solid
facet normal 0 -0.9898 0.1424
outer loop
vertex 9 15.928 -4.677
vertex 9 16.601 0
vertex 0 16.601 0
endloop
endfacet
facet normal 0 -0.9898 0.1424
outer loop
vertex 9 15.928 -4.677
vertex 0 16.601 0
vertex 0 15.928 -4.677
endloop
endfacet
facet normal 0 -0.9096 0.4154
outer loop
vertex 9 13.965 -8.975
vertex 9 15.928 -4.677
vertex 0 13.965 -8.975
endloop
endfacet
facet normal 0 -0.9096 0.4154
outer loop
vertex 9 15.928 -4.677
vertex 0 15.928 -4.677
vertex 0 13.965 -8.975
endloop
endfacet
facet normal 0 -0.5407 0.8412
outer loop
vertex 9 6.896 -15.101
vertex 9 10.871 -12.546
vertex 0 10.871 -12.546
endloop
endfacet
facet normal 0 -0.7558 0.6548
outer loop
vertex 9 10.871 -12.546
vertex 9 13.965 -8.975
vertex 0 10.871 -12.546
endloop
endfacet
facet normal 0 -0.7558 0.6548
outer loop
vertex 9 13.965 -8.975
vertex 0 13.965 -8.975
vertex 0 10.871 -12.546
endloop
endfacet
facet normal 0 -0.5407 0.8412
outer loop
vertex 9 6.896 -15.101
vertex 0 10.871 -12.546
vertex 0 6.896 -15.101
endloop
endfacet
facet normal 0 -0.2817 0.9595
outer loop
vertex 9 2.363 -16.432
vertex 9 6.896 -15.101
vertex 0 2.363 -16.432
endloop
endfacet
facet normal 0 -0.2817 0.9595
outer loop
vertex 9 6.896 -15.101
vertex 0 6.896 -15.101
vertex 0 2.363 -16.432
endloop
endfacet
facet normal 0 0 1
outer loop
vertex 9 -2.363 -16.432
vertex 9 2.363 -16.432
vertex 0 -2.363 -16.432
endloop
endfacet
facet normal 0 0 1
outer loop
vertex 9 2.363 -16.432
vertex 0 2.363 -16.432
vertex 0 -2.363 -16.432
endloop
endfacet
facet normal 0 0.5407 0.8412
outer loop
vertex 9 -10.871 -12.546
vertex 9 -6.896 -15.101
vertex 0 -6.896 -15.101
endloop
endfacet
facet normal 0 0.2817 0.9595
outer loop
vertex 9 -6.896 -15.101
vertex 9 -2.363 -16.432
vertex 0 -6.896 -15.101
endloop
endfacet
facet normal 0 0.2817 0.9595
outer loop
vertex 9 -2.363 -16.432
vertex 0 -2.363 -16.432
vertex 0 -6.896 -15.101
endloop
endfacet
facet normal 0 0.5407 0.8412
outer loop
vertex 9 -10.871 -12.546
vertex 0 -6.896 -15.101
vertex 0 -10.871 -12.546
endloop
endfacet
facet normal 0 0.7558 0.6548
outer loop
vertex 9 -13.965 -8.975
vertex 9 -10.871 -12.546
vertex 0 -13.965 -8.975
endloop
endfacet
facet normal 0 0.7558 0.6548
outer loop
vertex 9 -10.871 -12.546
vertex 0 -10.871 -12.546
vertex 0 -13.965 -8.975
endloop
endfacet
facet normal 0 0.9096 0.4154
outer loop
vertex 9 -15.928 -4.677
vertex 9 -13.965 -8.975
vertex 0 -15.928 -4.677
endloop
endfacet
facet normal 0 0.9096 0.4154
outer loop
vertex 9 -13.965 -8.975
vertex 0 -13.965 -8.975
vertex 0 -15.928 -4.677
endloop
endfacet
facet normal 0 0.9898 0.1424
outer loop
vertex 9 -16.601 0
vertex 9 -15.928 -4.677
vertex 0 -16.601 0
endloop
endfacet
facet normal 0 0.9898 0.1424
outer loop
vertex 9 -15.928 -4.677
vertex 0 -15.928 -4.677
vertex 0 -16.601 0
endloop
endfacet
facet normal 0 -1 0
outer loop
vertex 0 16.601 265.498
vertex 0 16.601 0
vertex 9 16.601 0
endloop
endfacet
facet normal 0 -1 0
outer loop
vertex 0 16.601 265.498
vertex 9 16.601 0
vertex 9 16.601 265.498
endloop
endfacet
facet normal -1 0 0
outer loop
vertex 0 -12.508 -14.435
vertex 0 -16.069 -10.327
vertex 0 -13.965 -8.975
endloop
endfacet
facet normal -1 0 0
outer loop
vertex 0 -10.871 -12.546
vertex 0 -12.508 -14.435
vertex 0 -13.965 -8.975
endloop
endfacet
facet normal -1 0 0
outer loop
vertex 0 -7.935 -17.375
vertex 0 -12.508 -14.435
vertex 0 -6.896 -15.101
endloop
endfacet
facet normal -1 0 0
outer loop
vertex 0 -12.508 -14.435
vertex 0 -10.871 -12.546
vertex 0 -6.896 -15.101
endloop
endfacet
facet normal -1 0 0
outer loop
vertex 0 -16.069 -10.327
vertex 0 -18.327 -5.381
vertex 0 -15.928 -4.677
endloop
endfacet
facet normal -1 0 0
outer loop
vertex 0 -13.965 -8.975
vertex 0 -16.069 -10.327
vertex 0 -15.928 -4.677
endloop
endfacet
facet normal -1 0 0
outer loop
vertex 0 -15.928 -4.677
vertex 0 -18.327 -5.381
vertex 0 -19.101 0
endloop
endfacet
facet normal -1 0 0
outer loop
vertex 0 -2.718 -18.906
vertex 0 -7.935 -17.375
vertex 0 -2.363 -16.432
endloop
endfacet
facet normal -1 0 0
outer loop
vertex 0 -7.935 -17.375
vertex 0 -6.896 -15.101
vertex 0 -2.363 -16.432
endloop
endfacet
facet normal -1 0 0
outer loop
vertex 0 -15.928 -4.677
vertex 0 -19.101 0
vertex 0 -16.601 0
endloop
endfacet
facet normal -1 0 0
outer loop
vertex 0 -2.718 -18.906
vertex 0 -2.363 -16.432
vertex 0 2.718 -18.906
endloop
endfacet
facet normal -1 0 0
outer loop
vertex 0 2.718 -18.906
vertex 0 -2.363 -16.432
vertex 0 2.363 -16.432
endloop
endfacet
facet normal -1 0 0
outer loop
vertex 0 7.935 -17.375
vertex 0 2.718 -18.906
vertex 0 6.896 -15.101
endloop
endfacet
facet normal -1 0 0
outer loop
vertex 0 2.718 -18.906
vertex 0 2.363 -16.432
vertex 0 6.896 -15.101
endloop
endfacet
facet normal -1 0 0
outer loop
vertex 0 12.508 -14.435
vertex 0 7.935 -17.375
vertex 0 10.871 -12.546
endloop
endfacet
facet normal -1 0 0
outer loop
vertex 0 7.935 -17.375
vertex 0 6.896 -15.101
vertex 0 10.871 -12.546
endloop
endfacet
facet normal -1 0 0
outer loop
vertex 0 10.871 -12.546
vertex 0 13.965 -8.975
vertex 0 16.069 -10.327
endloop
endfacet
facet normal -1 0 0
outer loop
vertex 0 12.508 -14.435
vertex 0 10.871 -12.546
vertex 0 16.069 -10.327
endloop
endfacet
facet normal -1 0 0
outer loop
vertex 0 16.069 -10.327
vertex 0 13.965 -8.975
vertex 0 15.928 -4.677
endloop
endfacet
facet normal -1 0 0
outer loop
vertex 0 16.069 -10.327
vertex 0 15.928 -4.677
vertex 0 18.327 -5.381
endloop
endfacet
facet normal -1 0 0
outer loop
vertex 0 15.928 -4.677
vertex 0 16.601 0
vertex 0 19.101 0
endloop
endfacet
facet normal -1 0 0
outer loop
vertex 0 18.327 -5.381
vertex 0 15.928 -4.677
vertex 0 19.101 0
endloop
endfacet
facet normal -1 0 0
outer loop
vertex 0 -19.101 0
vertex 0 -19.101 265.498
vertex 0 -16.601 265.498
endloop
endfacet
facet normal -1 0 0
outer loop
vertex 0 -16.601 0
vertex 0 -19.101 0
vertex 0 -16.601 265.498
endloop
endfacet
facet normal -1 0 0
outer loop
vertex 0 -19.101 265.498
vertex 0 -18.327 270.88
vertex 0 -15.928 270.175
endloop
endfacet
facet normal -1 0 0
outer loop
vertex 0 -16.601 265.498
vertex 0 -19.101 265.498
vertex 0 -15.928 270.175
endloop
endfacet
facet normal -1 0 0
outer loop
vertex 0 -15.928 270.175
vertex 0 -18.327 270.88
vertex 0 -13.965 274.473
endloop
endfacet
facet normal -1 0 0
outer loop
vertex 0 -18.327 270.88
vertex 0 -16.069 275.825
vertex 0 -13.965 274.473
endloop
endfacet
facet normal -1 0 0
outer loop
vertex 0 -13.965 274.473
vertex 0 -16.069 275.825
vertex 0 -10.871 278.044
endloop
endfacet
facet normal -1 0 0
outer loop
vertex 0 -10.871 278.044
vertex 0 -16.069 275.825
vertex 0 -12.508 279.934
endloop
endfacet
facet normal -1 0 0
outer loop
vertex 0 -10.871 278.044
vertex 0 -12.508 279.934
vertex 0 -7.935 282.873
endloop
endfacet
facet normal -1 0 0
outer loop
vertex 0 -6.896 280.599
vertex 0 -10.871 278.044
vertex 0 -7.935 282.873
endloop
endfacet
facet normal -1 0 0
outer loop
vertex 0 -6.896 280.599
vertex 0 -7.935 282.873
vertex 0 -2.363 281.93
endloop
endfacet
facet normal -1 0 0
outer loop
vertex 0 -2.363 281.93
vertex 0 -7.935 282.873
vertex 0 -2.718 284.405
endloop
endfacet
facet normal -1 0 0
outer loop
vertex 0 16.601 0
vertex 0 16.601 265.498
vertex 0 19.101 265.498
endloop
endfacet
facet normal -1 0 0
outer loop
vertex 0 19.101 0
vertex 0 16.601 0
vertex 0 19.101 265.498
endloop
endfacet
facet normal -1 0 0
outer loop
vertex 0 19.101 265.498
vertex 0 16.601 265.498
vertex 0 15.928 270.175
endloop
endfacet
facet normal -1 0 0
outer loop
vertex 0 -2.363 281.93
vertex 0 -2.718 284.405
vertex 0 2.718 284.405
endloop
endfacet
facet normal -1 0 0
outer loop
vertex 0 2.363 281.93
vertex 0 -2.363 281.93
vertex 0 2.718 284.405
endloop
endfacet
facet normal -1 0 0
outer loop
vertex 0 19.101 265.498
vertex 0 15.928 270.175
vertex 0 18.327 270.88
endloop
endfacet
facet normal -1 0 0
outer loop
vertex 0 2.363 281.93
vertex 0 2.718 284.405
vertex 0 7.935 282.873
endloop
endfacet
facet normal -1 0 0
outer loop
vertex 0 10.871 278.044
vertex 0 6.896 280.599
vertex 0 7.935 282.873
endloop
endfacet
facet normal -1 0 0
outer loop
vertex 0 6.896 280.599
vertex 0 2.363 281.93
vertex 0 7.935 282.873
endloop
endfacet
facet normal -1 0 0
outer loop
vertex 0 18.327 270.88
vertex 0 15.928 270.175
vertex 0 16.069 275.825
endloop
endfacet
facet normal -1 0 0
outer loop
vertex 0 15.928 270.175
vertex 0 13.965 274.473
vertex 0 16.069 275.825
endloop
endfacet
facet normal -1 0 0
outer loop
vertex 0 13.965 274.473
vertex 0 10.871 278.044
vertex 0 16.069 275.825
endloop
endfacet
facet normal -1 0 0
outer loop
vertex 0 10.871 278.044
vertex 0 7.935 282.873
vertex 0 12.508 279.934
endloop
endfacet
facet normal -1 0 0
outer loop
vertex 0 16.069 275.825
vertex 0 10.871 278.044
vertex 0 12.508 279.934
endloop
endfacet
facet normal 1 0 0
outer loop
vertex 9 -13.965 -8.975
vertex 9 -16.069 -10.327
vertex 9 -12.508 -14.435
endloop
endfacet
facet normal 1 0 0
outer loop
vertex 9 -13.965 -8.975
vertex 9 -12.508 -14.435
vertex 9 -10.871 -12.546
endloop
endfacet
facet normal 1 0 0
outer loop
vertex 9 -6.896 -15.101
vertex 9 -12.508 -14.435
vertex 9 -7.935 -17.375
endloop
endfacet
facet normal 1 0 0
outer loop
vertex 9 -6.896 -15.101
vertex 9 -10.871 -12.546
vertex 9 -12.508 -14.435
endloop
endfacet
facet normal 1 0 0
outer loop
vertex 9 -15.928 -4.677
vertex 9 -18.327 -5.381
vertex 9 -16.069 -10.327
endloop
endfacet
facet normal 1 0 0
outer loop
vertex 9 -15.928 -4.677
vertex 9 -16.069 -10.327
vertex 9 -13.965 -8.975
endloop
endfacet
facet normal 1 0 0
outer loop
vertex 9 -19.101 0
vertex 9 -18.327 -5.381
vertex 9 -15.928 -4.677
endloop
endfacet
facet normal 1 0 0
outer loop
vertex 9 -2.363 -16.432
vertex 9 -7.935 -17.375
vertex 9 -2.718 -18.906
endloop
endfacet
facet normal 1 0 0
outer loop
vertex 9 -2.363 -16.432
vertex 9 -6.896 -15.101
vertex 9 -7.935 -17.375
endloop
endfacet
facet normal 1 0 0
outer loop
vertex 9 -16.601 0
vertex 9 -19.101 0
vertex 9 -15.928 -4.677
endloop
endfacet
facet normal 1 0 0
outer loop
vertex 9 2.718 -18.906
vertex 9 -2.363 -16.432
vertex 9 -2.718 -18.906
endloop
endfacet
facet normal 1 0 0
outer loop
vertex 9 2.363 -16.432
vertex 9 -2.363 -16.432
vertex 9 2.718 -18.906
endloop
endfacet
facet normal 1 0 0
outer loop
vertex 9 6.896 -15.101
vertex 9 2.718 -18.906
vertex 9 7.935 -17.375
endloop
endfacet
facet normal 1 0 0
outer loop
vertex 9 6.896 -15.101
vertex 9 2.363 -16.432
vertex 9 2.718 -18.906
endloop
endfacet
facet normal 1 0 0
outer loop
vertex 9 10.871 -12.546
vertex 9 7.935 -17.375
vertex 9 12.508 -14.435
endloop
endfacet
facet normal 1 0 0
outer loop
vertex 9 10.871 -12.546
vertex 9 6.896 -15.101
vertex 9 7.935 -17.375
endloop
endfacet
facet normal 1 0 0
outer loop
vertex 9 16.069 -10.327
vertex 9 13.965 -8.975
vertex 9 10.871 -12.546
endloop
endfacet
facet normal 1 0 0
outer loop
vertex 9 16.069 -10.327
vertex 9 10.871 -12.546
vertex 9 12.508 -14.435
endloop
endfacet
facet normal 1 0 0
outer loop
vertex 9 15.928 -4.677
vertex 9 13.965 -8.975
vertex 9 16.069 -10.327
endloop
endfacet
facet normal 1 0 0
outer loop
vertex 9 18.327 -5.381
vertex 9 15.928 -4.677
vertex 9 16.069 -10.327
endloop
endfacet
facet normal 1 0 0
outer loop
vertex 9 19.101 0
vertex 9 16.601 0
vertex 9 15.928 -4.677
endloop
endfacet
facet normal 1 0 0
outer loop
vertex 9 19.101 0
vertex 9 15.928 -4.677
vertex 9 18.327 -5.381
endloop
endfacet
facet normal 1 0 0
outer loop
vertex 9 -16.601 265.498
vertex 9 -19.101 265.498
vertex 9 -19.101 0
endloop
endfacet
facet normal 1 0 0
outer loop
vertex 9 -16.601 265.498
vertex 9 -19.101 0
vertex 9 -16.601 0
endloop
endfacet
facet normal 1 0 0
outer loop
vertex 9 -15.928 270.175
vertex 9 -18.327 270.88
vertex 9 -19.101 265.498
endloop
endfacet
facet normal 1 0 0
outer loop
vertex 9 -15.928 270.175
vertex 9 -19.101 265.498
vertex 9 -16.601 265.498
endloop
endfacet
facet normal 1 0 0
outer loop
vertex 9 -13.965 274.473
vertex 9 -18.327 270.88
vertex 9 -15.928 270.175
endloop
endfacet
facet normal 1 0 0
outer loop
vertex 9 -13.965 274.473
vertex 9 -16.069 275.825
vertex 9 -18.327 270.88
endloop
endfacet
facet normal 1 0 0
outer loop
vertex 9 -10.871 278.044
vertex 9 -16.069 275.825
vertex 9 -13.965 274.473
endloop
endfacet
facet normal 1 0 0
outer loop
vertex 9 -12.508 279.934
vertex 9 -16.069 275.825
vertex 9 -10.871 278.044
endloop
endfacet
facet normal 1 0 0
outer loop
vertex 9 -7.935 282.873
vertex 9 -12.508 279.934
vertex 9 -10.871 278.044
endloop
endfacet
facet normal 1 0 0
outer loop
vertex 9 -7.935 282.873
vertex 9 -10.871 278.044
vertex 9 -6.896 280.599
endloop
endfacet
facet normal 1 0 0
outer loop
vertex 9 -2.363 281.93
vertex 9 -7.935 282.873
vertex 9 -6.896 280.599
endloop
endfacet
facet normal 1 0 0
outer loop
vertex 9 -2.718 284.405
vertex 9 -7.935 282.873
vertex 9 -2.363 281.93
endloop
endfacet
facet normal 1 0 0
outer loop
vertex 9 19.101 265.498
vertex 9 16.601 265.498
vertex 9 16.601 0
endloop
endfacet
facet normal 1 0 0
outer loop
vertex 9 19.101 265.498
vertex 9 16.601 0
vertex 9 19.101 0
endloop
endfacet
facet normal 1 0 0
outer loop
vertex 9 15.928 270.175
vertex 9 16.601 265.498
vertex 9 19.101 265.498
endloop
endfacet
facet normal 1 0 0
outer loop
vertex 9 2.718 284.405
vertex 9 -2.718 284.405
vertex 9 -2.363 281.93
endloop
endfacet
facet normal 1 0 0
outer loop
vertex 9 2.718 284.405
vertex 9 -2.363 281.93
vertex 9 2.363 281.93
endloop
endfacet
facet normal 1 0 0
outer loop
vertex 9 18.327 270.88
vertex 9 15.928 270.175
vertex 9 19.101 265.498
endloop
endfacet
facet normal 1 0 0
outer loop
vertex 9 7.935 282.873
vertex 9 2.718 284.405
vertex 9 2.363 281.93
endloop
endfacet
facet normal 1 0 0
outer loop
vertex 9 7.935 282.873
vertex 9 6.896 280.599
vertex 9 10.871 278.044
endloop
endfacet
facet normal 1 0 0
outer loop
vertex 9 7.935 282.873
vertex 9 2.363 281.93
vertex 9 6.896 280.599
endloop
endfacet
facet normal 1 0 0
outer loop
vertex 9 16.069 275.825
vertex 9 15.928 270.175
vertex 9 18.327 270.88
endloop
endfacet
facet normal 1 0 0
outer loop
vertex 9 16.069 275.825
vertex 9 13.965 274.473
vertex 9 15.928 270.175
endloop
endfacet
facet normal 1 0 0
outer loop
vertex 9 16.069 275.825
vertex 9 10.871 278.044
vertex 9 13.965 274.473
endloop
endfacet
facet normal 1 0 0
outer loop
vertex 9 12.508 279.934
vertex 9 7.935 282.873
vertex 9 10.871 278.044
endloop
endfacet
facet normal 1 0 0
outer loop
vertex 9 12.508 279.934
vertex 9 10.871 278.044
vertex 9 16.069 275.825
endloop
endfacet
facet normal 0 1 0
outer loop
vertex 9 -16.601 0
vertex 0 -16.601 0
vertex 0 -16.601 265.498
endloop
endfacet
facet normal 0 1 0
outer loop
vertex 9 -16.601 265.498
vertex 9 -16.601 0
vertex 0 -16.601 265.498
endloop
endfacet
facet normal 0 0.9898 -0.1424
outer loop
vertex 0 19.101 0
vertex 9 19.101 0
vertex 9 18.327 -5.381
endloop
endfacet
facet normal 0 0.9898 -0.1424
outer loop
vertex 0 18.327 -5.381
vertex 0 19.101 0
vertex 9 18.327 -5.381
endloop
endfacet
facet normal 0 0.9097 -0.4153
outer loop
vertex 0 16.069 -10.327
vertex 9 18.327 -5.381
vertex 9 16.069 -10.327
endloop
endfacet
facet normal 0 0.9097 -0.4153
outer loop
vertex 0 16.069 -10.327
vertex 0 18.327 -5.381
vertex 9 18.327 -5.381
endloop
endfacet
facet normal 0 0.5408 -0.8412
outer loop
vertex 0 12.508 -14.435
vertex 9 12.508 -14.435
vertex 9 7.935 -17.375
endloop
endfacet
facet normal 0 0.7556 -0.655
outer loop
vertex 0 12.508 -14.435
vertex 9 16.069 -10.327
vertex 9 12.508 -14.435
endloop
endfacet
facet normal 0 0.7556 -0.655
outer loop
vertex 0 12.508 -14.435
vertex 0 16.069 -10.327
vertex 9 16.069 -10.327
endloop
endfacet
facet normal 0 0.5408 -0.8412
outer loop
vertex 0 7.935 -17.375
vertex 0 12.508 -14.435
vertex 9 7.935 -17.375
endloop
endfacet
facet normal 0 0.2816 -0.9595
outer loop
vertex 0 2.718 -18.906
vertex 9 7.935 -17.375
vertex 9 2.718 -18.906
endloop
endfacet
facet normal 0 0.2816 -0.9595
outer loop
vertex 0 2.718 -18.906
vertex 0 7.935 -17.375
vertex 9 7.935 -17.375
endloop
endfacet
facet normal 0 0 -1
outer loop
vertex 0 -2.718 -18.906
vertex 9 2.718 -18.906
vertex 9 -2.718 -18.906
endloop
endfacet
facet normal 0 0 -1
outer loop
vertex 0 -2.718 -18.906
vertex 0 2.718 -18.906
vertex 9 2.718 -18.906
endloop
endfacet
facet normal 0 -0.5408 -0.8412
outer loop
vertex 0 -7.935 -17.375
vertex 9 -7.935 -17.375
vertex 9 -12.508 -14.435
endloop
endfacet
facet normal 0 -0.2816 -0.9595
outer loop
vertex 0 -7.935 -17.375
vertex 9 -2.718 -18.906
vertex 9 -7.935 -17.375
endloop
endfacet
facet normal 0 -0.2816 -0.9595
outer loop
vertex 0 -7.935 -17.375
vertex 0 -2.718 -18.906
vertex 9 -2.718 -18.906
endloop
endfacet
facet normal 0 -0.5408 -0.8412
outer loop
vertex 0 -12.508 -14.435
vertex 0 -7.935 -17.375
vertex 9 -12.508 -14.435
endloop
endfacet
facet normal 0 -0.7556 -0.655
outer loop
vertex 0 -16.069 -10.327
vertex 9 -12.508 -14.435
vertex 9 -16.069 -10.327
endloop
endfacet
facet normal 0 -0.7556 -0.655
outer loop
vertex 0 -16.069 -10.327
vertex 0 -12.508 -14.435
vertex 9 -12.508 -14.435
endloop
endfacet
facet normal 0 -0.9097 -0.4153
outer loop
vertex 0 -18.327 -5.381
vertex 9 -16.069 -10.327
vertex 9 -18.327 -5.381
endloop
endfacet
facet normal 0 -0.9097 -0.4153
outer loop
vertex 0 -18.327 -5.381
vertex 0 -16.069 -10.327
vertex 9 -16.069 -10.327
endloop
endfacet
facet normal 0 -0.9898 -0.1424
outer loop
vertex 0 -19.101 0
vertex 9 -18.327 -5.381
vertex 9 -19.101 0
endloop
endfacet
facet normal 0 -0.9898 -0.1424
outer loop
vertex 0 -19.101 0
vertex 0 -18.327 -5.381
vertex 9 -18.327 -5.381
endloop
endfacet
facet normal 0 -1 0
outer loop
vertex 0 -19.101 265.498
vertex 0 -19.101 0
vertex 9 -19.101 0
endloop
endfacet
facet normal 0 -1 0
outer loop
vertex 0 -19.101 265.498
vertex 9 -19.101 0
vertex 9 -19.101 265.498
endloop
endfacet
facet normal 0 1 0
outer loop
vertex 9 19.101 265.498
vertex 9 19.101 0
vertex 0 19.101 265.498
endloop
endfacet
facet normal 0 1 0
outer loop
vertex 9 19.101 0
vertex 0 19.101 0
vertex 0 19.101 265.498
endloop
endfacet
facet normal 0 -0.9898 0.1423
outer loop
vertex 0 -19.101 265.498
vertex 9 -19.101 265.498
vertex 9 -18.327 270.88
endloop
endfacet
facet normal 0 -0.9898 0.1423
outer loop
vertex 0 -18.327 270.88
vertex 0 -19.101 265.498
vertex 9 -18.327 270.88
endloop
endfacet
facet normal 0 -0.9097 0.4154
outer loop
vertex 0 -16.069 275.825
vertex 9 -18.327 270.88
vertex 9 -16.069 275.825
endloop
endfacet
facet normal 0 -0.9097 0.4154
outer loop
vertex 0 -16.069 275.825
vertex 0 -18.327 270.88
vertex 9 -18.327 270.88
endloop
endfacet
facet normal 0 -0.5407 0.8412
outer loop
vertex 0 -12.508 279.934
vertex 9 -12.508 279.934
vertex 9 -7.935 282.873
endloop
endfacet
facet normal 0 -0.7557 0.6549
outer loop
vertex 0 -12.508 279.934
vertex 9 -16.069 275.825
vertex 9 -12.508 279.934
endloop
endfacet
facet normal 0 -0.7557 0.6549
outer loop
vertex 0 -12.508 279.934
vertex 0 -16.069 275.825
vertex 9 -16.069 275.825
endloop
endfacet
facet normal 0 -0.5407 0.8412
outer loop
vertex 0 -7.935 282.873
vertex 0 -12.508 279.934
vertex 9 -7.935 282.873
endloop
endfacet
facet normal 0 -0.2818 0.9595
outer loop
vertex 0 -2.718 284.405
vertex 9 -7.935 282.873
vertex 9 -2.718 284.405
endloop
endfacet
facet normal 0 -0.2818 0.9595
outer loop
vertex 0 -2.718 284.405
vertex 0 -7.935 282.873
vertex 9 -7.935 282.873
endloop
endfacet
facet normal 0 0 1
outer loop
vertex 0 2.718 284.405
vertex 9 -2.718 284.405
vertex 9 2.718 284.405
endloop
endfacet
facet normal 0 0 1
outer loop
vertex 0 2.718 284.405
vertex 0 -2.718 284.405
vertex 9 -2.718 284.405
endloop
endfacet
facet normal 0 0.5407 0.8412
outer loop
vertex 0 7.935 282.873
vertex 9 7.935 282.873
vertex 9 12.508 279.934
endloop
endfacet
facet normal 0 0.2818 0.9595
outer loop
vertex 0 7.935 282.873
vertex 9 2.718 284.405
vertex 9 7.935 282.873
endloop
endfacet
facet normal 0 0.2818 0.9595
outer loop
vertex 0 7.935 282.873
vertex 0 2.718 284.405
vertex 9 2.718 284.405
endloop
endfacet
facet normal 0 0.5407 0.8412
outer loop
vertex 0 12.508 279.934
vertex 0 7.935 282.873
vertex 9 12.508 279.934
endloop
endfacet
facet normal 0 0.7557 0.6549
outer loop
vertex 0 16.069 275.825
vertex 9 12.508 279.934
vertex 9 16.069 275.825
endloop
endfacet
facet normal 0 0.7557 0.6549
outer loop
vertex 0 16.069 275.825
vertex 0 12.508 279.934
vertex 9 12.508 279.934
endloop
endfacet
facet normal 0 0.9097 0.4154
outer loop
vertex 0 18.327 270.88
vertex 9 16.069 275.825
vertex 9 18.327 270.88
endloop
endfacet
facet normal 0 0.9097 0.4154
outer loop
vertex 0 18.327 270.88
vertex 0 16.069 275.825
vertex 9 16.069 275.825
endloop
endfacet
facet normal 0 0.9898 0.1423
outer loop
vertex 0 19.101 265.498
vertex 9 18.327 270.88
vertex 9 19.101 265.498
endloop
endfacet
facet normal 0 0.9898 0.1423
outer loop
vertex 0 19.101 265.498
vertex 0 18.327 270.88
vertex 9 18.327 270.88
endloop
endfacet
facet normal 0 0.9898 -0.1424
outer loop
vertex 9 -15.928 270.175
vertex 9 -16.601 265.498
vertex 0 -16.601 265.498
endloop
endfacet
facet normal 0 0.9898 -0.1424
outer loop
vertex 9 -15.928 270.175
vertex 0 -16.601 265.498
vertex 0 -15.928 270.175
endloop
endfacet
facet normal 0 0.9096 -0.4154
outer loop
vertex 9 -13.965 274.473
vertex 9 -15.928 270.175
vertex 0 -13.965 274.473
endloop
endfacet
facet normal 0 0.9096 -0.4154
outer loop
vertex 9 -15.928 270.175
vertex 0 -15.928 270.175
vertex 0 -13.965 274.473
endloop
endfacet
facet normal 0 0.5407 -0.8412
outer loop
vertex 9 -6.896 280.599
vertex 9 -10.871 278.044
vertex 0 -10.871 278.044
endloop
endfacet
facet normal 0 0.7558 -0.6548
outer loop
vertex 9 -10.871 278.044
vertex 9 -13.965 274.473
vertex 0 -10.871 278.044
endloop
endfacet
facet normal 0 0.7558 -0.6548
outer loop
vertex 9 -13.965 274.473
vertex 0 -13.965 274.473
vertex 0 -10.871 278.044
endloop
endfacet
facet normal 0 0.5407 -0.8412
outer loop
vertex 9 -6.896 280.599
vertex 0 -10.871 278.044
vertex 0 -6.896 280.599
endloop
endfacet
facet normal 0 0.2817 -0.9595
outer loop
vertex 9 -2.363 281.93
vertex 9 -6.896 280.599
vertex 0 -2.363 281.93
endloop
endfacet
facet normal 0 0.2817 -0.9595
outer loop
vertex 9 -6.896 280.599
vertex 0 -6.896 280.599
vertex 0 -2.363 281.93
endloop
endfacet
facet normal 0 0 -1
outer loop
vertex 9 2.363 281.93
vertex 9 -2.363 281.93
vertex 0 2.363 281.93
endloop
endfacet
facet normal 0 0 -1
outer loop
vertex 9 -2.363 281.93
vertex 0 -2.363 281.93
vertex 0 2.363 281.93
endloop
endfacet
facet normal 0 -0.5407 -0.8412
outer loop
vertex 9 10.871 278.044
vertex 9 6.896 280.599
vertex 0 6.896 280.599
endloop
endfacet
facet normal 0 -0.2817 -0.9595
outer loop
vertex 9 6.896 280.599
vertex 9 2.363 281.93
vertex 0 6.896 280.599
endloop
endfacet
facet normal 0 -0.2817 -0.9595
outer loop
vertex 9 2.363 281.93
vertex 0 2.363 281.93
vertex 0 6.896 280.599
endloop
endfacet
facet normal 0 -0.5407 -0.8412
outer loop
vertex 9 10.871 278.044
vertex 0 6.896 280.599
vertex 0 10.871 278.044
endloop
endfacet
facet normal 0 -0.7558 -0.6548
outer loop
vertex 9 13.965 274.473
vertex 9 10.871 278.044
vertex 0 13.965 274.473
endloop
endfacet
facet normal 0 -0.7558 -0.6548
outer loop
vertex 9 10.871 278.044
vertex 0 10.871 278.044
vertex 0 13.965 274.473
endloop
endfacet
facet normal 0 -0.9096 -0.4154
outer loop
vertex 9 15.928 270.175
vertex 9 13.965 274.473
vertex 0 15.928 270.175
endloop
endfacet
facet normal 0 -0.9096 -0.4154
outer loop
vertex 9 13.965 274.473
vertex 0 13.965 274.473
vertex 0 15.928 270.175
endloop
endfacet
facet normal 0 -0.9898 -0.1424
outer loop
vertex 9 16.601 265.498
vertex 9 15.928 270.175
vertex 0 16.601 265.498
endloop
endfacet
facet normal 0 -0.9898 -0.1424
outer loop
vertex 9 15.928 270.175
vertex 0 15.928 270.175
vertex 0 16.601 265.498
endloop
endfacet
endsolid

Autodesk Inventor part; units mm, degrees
ref_plane "YZ Plane" through (0, 0, 0) normal (1, 0, 0) x (0, 1, 0)
ref_plane "XZ Plane" through (0, 0, 0) normal (0, 1, 0) x (-1, 0, 0)
ref_plane "XY Plane" through (0, 0, 0) normal (0, 0, 1) x (1, 0, 0)
sketch "Sketch1" plane through (0, 0, 0) normal (1, 0, 0) x (0, 1, 0)
  arc A0 (-16.6008, 0) -> (16.6008, 0) centre (0, 0) ccw
  arc A1 (-19.1008, 0) -> (19.1008, 0) centre (0, 0) ccw
  arc A2 (16.6008, 265.4982) -> (-16.6008, 265.4982) centre (0, 265.4982) ccw
  arc A3 (19.1008, 265.4982) -> (-19.1008, 265.4982) centre (0, 265.4982) ccw
  line L0 (16.6008, 0) -> (16.6008, 265.4982)
  line L1 (-16.6008, 0) -> (-16.6008, 265.4982)
  line L2 (19.1008, 0) -> (19.1008, 265.4982)
  line L3 (-19.1008, 0) -> (-19.1008, 265.4982)
  dimension "d0" = 2.5
  dimension "d2" = 265.4982
  dimension "d5" = 19.1008
extrude "Extrusion1" add sketch "Sketch1" along normal blind 9
properties part number "STANDIN,130T,HTD5mm,BELT" material "Nylon 6/6"
